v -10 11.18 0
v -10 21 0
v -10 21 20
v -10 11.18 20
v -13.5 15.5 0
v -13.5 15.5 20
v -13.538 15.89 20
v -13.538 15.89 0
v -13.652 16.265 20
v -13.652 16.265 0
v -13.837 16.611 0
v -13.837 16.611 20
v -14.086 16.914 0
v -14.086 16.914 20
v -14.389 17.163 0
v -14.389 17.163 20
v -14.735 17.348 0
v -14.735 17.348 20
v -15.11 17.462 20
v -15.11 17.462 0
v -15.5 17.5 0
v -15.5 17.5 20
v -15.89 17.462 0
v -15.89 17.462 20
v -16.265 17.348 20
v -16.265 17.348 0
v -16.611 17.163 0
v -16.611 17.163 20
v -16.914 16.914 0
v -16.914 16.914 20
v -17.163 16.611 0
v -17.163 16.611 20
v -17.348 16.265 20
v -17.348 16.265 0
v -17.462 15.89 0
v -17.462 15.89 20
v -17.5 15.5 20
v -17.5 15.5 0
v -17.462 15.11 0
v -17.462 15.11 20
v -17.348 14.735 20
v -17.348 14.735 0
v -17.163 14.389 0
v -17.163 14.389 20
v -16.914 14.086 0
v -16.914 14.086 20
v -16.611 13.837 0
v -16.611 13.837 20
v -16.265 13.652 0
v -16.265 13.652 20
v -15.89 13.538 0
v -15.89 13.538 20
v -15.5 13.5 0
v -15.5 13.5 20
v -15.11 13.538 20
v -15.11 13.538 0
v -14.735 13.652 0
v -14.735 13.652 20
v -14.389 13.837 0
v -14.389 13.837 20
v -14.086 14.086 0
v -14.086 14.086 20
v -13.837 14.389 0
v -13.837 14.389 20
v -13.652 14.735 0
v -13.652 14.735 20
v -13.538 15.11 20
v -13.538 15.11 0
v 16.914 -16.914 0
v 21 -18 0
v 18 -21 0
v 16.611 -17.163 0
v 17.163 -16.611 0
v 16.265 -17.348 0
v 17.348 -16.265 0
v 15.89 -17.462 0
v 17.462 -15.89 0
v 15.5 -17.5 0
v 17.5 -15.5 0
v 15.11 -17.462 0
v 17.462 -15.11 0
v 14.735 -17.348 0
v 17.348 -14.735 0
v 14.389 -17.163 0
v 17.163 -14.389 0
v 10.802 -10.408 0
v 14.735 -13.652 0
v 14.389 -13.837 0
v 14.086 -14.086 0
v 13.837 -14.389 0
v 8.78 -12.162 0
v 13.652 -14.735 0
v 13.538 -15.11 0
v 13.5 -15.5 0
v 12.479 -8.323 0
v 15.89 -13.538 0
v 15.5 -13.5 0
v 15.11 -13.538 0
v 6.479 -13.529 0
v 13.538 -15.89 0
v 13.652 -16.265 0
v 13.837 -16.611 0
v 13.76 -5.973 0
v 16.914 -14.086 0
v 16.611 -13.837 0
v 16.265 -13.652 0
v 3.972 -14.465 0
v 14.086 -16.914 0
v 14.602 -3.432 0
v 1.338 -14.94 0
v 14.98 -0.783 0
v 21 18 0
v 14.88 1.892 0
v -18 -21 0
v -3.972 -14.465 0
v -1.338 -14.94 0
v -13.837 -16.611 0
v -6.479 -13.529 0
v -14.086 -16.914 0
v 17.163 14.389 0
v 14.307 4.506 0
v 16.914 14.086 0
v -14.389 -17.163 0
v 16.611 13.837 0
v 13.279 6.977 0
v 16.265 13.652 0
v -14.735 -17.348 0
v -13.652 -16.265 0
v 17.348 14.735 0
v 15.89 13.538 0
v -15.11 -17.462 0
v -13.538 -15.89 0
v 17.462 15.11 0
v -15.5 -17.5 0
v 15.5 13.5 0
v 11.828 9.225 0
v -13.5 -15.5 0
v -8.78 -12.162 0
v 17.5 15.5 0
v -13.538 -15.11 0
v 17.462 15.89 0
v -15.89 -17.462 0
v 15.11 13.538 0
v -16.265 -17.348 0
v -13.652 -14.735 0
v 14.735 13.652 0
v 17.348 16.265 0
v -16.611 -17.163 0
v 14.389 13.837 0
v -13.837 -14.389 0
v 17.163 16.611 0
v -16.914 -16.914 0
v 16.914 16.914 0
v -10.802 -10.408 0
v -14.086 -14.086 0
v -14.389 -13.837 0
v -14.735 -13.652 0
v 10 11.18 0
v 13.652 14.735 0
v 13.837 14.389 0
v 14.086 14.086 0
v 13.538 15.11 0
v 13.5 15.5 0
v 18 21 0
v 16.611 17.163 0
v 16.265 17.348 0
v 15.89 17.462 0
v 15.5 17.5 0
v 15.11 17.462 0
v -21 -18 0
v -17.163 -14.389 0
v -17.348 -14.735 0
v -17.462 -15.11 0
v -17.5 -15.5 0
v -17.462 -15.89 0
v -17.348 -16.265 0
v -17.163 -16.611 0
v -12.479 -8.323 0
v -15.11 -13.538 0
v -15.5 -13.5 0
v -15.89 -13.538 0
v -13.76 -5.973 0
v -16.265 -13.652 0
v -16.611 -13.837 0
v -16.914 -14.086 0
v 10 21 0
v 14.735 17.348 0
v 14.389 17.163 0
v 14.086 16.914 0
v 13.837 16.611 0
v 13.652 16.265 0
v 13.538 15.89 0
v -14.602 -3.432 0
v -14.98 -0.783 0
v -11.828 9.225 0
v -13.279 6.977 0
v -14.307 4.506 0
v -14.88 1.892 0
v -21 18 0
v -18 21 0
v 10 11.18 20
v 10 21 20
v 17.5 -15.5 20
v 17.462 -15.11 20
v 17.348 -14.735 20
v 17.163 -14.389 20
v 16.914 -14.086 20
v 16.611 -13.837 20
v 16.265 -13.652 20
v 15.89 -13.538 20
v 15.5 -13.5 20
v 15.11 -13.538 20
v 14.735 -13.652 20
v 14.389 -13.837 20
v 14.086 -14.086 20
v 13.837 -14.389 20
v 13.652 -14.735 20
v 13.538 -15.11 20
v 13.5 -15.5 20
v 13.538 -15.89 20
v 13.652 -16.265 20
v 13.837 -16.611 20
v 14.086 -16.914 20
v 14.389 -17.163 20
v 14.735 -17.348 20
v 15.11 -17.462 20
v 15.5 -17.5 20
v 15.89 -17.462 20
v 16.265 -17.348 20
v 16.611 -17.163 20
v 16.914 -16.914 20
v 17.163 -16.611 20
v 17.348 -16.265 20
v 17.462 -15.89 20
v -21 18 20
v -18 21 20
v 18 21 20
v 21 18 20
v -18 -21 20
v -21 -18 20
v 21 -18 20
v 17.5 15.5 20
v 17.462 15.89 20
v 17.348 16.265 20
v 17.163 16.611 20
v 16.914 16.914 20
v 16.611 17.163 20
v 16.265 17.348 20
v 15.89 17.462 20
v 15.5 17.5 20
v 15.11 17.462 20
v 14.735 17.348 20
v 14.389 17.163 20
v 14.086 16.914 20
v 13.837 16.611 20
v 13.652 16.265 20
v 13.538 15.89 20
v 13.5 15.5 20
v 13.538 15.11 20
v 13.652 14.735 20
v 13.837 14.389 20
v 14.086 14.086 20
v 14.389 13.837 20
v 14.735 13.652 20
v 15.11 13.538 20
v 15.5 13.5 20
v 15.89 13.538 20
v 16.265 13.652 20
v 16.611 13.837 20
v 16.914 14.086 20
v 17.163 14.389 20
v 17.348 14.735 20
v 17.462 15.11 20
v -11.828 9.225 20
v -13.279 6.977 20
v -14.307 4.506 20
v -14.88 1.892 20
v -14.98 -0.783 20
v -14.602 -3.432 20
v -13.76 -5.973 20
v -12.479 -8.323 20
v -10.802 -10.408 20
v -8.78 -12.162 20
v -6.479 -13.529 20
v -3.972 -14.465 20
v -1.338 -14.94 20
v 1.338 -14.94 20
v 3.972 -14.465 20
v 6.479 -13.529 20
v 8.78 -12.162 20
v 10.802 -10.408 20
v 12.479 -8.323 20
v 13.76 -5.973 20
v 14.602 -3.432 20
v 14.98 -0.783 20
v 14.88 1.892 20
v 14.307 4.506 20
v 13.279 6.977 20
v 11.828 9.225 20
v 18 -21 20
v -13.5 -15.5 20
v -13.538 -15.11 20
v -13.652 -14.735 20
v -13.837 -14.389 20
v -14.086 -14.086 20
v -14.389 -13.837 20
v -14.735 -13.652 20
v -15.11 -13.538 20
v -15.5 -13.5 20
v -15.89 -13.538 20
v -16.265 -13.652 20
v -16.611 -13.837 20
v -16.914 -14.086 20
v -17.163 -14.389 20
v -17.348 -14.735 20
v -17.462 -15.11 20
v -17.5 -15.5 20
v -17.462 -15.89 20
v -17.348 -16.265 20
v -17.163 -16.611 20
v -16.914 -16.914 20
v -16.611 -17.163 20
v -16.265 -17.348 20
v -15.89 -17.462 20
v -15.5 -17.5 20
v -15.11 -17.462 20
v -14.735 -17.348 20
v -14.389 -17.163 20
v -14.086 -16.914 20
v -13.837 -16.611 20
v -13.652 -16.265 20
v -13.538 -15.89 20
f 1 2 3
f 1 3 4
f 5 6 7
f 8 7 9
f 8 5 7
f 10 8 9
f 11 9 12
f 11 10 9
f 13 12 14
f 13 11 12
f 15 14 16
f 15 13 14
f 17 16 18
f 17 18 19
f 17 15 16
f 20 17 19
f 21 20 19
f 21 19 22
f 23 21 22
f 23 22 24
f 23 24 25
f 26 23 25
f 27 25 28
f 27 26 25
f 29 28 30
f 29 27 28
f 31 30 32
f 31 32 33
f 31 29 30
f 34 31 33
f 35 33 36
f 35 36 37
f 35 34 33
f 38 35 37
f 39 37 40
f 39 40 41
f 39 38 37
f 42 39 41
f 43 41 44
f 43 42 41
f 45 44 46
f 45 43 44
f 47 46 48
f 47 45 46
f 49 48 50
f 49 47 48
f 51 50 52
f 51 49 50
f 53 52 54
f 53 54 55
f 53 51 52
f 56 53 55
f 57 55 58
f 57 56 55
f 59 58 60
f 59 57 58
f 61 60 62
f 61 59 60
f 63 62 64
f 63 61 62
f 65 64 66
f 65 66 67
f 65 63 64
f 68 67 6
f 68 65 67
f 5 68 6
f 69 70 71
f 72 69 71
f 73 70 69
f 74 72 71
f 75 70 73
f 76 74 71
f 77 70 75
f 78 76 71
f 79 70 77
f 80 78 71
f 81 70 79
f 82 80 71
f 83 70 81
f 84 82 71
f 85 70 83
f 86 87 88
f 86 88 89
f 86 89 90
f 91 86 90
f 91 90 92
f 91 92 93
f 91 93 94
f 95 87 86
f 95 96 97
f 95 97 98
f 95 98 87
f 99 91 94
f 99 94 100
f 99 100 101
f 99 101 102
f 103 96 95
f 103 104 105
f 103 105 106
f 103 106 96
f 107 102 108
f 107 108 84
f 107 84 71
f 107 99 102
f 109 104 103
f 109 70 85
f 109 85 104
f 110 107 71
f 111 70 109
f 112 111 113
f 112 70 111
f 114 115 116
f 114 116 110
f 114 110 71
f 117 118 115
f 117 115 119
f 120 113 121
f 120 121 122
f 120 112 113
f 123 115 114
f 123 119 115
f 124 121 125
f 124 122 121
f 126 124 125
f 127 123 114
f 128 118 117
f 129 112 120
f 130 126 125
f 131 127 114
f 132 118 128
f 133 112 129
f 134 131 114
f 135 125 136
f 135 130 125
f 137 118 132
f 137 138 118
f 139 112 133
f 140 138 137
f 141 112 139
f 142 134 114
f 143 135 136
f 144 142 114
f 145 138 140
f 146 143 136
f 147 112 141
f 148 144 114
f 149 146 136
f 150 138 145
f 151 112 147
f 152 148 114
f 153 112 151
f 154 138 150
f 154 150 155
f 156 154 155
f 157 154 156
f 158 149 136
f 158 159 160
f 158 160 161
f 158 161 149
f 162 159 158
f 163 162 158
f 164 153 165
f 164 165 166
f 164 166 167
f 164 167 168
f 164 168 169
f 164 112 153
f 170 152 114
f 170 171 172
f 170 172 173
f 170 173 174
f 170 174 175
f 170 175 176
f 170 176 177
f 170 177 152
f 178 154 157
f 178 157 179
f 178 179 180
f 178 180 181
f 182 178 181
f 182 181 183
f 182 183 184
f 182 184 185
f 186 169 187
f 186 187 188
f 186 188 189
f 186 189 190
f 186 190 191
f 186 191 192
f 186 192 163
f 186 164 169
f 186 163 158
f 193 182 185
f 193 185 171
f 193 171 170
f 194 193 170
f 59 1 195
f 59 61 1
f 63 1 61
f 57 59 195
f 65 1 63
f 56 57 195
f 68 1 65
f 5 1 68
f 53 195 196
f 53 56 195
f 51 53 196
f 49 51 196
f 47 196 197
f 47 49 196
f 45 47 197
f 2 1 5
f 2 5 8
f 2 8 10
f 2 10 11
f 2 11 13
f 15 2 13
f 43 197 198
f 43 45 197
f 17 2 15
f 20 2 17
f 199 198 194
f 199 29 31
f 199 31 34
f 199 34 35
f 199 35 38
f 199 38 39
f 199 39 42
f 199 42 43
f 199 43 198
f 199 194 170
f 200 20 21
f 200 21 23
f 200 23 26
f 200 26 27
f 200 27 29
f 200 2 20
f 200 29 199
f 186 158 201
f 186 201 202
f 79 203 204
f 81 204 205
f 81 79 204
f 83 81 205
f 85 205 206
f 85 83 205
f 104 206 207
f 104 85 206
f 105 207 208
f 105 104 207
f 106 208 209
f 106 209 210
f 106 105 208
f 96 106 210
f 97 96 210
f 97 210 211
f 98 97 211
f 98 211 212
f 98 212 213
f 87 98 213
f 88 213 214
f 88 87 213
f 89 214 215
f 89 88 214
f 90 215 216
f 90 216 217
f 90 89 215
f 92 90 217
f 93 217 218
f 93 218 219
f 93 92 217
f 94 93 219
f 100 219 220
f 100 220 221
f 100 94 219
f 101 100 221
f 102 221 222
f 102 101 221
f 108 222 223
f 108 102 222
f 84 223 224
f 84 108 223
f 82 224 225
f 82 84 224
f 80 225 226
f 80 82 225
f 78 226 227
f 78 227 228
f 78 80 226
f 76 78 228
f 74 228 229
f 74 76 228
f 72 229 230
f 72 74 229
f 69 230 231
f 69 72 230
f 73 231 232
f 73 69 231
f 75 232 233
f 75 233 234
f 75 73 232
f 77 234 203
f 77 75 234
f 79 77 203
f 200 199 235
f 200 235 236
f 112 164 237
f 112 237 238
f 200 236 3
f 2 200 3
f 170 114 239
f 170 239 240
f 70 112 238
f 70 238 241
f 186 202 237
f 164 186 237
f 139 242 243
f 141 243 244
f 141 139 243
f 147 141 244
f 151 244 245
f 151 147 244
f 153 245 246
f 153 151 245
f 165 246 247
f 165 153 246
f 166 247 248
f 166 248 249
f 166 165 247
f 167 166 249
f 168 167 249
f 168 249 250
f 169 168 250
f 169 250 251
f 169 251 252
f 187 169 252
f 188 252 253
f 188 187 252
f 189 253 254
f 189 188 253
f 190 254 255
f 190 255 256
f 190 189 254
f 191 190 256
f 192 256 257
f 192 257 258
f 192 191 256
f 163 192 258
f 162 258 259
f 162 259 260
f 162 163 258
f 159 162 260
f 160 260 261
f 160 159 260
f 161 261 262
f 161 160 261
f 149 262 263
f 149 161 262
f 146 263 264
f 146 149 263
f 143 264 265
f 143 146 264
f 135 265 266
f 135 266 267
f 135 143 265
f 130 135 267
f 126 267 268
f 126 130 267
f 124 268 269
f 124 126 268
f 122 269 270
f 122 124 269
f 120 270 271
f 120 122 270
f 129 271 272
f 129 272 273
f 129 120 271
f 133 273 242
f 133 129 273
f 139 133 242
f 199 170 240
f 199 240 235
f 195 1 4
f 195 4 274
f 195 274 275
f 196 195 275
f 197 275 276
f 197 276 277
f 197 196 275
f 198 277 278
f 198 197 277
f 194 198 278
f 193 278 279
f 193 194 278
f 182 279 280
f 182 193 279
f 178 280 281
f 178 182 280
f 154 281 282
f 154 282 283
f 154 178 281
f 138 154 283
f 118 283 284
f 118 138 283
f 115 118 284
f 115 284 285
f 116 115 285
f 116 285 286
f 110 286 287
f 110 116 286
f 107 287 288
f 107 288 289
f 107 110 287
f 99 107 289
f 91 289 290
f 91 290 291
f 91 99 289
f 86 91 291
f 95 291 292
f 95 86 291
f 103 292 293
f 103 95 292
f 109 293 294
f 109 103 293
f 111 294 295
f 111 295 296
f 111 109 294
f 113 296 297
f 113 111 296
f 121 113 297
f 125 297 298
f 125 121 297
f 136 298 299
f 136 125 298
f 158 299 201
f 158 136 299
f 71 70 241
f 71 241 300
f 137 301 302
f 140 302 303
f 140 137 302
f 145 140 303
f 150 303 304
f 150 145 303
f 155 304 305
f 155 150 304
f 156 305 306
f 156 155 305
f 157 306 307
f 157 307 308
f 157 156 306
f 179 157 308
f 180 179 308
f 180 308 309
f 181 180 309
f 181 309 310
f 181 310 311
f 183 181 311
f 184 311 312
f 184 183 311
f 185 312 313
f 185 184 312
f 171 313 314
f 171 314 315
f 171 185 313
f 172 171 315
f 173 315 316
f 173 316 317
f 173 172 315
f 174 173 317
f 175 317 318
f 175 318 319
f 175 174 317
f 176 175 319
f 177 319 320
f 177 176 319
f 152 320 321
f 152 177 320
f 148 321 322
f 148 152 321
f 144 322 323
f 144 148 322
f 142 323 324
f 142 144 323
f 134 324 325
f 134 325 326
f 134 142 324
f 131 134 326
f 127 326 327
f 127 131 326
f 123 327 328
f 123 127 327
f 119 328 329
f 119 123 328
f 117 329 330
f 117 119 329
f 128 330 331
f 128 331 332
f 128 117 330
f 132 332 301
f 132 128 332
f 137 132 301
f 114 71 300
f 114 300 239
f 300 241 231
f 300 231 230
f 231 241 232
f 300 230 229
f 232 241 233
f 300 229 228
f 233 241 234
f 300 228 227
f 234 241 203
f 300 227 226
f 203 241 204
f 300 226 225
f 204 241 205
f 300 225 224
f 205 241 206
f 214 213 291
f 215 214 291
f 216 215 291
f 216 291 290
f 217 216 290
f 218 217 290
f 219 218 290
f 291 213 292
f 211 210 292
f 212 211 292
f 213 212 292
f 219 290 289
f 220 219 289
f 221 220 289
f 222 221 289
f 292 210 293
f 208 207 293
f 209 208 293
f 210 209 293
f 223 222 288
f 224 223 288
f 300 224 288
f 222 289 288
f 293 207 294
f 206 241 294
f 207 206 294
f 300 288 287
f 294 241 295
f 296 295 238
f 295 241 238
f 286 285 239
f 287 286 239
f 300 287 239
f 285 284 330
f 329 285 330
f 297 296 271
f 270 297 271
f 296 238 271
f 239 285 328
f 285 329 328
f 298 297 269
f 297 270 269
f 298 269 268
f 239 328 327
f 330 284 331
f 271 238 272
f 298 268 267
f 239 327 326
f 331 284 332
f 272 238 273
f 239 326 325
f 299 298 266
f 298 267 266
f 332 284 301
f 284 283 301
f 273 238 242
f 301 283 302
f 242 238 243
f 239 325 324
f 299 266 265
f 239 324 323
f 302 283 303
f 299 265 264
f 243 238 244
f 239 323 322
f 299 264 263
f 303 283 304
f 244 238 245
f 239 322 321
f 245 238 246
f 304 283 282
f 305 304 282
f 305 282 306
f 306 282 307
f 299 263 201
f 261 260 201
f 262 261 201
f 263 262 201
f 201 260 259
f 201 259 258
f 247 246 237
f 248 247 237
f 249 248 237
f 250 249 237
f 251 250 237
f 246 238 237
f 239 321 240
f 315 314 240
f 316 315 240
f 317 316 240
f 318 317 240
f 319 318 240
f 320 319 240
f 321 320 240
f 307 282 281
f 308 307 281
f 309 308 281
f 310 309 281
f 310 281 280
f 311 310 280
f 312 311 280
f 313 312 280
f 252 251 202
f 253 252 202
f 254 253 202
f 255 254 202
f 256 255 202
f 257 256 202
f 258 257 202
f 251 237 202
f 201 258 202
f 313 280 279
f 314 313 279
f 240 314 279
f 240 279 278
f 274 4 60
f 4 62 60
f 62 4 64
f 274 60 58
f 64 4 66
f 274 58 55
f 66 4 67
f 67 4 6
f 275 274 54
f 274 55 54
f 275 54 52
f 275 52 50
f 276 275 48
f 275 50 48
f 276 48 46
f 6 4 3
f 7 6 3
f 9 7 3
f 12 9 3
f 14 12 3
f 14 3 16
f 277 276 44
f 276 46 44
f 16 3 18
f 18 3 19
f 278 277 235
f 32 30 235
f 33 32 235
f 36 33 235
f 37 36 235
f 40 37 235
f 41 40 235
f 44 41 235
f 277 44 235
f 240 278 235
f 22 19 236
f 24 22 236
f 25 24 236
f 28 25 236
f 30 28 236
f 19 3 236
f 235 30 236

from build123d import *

# Parameters (mm, degrees)
SKETCH_1_R      = 2
EXTRUDE_1_DEPTH = 20


with BuildPart() as part:
    # 草图1 → 凸台-拉伸1 (new body)
    with BuildSketch(Plane.XY):
        with BuildLine():
            Line((-21, 18), (-18, 21))
            Line((-18, 21), (-10, 21))
            Line((-10, 21), (-10, 11.180339887))
            ThreePointArc((-10, 11.180339887), (0, -15), (10, 11.180339887))
            Line((10, 11.180339887), (10, 21))
            Line((10, 21), (18, 21))
            Line((18, 21), (21, 18))
            Line((21, 18), (21, -18))
            Line((21, -18), (18, -21))
            Line((18, -21), (-18, -21))
            Line((-18, -21), (-21, -18))
            Line((-21, -18), (-21, 18))
        make_face()
        with Locations((15.5, 15.5)):
            Circle(SKETCH_1_R, mode=Mode.SUBTRACT)
        with Locations((15.5, -15.5)):
            Circle(SKETCH_1_R, mode=Mode.SUBTRACT)
        with Locations((-15.5, -15.5)):
            Circle(SKETCH_1_R, mode=Mode.SUBTRACT)
        with Locations((-15.5, 15.5)):
            Circle(SKETCH_1_R, mode=Mode.SUBTRACT)
    extrude(amount=EXTRUDE_1_DEPTH)


solid = part.part
